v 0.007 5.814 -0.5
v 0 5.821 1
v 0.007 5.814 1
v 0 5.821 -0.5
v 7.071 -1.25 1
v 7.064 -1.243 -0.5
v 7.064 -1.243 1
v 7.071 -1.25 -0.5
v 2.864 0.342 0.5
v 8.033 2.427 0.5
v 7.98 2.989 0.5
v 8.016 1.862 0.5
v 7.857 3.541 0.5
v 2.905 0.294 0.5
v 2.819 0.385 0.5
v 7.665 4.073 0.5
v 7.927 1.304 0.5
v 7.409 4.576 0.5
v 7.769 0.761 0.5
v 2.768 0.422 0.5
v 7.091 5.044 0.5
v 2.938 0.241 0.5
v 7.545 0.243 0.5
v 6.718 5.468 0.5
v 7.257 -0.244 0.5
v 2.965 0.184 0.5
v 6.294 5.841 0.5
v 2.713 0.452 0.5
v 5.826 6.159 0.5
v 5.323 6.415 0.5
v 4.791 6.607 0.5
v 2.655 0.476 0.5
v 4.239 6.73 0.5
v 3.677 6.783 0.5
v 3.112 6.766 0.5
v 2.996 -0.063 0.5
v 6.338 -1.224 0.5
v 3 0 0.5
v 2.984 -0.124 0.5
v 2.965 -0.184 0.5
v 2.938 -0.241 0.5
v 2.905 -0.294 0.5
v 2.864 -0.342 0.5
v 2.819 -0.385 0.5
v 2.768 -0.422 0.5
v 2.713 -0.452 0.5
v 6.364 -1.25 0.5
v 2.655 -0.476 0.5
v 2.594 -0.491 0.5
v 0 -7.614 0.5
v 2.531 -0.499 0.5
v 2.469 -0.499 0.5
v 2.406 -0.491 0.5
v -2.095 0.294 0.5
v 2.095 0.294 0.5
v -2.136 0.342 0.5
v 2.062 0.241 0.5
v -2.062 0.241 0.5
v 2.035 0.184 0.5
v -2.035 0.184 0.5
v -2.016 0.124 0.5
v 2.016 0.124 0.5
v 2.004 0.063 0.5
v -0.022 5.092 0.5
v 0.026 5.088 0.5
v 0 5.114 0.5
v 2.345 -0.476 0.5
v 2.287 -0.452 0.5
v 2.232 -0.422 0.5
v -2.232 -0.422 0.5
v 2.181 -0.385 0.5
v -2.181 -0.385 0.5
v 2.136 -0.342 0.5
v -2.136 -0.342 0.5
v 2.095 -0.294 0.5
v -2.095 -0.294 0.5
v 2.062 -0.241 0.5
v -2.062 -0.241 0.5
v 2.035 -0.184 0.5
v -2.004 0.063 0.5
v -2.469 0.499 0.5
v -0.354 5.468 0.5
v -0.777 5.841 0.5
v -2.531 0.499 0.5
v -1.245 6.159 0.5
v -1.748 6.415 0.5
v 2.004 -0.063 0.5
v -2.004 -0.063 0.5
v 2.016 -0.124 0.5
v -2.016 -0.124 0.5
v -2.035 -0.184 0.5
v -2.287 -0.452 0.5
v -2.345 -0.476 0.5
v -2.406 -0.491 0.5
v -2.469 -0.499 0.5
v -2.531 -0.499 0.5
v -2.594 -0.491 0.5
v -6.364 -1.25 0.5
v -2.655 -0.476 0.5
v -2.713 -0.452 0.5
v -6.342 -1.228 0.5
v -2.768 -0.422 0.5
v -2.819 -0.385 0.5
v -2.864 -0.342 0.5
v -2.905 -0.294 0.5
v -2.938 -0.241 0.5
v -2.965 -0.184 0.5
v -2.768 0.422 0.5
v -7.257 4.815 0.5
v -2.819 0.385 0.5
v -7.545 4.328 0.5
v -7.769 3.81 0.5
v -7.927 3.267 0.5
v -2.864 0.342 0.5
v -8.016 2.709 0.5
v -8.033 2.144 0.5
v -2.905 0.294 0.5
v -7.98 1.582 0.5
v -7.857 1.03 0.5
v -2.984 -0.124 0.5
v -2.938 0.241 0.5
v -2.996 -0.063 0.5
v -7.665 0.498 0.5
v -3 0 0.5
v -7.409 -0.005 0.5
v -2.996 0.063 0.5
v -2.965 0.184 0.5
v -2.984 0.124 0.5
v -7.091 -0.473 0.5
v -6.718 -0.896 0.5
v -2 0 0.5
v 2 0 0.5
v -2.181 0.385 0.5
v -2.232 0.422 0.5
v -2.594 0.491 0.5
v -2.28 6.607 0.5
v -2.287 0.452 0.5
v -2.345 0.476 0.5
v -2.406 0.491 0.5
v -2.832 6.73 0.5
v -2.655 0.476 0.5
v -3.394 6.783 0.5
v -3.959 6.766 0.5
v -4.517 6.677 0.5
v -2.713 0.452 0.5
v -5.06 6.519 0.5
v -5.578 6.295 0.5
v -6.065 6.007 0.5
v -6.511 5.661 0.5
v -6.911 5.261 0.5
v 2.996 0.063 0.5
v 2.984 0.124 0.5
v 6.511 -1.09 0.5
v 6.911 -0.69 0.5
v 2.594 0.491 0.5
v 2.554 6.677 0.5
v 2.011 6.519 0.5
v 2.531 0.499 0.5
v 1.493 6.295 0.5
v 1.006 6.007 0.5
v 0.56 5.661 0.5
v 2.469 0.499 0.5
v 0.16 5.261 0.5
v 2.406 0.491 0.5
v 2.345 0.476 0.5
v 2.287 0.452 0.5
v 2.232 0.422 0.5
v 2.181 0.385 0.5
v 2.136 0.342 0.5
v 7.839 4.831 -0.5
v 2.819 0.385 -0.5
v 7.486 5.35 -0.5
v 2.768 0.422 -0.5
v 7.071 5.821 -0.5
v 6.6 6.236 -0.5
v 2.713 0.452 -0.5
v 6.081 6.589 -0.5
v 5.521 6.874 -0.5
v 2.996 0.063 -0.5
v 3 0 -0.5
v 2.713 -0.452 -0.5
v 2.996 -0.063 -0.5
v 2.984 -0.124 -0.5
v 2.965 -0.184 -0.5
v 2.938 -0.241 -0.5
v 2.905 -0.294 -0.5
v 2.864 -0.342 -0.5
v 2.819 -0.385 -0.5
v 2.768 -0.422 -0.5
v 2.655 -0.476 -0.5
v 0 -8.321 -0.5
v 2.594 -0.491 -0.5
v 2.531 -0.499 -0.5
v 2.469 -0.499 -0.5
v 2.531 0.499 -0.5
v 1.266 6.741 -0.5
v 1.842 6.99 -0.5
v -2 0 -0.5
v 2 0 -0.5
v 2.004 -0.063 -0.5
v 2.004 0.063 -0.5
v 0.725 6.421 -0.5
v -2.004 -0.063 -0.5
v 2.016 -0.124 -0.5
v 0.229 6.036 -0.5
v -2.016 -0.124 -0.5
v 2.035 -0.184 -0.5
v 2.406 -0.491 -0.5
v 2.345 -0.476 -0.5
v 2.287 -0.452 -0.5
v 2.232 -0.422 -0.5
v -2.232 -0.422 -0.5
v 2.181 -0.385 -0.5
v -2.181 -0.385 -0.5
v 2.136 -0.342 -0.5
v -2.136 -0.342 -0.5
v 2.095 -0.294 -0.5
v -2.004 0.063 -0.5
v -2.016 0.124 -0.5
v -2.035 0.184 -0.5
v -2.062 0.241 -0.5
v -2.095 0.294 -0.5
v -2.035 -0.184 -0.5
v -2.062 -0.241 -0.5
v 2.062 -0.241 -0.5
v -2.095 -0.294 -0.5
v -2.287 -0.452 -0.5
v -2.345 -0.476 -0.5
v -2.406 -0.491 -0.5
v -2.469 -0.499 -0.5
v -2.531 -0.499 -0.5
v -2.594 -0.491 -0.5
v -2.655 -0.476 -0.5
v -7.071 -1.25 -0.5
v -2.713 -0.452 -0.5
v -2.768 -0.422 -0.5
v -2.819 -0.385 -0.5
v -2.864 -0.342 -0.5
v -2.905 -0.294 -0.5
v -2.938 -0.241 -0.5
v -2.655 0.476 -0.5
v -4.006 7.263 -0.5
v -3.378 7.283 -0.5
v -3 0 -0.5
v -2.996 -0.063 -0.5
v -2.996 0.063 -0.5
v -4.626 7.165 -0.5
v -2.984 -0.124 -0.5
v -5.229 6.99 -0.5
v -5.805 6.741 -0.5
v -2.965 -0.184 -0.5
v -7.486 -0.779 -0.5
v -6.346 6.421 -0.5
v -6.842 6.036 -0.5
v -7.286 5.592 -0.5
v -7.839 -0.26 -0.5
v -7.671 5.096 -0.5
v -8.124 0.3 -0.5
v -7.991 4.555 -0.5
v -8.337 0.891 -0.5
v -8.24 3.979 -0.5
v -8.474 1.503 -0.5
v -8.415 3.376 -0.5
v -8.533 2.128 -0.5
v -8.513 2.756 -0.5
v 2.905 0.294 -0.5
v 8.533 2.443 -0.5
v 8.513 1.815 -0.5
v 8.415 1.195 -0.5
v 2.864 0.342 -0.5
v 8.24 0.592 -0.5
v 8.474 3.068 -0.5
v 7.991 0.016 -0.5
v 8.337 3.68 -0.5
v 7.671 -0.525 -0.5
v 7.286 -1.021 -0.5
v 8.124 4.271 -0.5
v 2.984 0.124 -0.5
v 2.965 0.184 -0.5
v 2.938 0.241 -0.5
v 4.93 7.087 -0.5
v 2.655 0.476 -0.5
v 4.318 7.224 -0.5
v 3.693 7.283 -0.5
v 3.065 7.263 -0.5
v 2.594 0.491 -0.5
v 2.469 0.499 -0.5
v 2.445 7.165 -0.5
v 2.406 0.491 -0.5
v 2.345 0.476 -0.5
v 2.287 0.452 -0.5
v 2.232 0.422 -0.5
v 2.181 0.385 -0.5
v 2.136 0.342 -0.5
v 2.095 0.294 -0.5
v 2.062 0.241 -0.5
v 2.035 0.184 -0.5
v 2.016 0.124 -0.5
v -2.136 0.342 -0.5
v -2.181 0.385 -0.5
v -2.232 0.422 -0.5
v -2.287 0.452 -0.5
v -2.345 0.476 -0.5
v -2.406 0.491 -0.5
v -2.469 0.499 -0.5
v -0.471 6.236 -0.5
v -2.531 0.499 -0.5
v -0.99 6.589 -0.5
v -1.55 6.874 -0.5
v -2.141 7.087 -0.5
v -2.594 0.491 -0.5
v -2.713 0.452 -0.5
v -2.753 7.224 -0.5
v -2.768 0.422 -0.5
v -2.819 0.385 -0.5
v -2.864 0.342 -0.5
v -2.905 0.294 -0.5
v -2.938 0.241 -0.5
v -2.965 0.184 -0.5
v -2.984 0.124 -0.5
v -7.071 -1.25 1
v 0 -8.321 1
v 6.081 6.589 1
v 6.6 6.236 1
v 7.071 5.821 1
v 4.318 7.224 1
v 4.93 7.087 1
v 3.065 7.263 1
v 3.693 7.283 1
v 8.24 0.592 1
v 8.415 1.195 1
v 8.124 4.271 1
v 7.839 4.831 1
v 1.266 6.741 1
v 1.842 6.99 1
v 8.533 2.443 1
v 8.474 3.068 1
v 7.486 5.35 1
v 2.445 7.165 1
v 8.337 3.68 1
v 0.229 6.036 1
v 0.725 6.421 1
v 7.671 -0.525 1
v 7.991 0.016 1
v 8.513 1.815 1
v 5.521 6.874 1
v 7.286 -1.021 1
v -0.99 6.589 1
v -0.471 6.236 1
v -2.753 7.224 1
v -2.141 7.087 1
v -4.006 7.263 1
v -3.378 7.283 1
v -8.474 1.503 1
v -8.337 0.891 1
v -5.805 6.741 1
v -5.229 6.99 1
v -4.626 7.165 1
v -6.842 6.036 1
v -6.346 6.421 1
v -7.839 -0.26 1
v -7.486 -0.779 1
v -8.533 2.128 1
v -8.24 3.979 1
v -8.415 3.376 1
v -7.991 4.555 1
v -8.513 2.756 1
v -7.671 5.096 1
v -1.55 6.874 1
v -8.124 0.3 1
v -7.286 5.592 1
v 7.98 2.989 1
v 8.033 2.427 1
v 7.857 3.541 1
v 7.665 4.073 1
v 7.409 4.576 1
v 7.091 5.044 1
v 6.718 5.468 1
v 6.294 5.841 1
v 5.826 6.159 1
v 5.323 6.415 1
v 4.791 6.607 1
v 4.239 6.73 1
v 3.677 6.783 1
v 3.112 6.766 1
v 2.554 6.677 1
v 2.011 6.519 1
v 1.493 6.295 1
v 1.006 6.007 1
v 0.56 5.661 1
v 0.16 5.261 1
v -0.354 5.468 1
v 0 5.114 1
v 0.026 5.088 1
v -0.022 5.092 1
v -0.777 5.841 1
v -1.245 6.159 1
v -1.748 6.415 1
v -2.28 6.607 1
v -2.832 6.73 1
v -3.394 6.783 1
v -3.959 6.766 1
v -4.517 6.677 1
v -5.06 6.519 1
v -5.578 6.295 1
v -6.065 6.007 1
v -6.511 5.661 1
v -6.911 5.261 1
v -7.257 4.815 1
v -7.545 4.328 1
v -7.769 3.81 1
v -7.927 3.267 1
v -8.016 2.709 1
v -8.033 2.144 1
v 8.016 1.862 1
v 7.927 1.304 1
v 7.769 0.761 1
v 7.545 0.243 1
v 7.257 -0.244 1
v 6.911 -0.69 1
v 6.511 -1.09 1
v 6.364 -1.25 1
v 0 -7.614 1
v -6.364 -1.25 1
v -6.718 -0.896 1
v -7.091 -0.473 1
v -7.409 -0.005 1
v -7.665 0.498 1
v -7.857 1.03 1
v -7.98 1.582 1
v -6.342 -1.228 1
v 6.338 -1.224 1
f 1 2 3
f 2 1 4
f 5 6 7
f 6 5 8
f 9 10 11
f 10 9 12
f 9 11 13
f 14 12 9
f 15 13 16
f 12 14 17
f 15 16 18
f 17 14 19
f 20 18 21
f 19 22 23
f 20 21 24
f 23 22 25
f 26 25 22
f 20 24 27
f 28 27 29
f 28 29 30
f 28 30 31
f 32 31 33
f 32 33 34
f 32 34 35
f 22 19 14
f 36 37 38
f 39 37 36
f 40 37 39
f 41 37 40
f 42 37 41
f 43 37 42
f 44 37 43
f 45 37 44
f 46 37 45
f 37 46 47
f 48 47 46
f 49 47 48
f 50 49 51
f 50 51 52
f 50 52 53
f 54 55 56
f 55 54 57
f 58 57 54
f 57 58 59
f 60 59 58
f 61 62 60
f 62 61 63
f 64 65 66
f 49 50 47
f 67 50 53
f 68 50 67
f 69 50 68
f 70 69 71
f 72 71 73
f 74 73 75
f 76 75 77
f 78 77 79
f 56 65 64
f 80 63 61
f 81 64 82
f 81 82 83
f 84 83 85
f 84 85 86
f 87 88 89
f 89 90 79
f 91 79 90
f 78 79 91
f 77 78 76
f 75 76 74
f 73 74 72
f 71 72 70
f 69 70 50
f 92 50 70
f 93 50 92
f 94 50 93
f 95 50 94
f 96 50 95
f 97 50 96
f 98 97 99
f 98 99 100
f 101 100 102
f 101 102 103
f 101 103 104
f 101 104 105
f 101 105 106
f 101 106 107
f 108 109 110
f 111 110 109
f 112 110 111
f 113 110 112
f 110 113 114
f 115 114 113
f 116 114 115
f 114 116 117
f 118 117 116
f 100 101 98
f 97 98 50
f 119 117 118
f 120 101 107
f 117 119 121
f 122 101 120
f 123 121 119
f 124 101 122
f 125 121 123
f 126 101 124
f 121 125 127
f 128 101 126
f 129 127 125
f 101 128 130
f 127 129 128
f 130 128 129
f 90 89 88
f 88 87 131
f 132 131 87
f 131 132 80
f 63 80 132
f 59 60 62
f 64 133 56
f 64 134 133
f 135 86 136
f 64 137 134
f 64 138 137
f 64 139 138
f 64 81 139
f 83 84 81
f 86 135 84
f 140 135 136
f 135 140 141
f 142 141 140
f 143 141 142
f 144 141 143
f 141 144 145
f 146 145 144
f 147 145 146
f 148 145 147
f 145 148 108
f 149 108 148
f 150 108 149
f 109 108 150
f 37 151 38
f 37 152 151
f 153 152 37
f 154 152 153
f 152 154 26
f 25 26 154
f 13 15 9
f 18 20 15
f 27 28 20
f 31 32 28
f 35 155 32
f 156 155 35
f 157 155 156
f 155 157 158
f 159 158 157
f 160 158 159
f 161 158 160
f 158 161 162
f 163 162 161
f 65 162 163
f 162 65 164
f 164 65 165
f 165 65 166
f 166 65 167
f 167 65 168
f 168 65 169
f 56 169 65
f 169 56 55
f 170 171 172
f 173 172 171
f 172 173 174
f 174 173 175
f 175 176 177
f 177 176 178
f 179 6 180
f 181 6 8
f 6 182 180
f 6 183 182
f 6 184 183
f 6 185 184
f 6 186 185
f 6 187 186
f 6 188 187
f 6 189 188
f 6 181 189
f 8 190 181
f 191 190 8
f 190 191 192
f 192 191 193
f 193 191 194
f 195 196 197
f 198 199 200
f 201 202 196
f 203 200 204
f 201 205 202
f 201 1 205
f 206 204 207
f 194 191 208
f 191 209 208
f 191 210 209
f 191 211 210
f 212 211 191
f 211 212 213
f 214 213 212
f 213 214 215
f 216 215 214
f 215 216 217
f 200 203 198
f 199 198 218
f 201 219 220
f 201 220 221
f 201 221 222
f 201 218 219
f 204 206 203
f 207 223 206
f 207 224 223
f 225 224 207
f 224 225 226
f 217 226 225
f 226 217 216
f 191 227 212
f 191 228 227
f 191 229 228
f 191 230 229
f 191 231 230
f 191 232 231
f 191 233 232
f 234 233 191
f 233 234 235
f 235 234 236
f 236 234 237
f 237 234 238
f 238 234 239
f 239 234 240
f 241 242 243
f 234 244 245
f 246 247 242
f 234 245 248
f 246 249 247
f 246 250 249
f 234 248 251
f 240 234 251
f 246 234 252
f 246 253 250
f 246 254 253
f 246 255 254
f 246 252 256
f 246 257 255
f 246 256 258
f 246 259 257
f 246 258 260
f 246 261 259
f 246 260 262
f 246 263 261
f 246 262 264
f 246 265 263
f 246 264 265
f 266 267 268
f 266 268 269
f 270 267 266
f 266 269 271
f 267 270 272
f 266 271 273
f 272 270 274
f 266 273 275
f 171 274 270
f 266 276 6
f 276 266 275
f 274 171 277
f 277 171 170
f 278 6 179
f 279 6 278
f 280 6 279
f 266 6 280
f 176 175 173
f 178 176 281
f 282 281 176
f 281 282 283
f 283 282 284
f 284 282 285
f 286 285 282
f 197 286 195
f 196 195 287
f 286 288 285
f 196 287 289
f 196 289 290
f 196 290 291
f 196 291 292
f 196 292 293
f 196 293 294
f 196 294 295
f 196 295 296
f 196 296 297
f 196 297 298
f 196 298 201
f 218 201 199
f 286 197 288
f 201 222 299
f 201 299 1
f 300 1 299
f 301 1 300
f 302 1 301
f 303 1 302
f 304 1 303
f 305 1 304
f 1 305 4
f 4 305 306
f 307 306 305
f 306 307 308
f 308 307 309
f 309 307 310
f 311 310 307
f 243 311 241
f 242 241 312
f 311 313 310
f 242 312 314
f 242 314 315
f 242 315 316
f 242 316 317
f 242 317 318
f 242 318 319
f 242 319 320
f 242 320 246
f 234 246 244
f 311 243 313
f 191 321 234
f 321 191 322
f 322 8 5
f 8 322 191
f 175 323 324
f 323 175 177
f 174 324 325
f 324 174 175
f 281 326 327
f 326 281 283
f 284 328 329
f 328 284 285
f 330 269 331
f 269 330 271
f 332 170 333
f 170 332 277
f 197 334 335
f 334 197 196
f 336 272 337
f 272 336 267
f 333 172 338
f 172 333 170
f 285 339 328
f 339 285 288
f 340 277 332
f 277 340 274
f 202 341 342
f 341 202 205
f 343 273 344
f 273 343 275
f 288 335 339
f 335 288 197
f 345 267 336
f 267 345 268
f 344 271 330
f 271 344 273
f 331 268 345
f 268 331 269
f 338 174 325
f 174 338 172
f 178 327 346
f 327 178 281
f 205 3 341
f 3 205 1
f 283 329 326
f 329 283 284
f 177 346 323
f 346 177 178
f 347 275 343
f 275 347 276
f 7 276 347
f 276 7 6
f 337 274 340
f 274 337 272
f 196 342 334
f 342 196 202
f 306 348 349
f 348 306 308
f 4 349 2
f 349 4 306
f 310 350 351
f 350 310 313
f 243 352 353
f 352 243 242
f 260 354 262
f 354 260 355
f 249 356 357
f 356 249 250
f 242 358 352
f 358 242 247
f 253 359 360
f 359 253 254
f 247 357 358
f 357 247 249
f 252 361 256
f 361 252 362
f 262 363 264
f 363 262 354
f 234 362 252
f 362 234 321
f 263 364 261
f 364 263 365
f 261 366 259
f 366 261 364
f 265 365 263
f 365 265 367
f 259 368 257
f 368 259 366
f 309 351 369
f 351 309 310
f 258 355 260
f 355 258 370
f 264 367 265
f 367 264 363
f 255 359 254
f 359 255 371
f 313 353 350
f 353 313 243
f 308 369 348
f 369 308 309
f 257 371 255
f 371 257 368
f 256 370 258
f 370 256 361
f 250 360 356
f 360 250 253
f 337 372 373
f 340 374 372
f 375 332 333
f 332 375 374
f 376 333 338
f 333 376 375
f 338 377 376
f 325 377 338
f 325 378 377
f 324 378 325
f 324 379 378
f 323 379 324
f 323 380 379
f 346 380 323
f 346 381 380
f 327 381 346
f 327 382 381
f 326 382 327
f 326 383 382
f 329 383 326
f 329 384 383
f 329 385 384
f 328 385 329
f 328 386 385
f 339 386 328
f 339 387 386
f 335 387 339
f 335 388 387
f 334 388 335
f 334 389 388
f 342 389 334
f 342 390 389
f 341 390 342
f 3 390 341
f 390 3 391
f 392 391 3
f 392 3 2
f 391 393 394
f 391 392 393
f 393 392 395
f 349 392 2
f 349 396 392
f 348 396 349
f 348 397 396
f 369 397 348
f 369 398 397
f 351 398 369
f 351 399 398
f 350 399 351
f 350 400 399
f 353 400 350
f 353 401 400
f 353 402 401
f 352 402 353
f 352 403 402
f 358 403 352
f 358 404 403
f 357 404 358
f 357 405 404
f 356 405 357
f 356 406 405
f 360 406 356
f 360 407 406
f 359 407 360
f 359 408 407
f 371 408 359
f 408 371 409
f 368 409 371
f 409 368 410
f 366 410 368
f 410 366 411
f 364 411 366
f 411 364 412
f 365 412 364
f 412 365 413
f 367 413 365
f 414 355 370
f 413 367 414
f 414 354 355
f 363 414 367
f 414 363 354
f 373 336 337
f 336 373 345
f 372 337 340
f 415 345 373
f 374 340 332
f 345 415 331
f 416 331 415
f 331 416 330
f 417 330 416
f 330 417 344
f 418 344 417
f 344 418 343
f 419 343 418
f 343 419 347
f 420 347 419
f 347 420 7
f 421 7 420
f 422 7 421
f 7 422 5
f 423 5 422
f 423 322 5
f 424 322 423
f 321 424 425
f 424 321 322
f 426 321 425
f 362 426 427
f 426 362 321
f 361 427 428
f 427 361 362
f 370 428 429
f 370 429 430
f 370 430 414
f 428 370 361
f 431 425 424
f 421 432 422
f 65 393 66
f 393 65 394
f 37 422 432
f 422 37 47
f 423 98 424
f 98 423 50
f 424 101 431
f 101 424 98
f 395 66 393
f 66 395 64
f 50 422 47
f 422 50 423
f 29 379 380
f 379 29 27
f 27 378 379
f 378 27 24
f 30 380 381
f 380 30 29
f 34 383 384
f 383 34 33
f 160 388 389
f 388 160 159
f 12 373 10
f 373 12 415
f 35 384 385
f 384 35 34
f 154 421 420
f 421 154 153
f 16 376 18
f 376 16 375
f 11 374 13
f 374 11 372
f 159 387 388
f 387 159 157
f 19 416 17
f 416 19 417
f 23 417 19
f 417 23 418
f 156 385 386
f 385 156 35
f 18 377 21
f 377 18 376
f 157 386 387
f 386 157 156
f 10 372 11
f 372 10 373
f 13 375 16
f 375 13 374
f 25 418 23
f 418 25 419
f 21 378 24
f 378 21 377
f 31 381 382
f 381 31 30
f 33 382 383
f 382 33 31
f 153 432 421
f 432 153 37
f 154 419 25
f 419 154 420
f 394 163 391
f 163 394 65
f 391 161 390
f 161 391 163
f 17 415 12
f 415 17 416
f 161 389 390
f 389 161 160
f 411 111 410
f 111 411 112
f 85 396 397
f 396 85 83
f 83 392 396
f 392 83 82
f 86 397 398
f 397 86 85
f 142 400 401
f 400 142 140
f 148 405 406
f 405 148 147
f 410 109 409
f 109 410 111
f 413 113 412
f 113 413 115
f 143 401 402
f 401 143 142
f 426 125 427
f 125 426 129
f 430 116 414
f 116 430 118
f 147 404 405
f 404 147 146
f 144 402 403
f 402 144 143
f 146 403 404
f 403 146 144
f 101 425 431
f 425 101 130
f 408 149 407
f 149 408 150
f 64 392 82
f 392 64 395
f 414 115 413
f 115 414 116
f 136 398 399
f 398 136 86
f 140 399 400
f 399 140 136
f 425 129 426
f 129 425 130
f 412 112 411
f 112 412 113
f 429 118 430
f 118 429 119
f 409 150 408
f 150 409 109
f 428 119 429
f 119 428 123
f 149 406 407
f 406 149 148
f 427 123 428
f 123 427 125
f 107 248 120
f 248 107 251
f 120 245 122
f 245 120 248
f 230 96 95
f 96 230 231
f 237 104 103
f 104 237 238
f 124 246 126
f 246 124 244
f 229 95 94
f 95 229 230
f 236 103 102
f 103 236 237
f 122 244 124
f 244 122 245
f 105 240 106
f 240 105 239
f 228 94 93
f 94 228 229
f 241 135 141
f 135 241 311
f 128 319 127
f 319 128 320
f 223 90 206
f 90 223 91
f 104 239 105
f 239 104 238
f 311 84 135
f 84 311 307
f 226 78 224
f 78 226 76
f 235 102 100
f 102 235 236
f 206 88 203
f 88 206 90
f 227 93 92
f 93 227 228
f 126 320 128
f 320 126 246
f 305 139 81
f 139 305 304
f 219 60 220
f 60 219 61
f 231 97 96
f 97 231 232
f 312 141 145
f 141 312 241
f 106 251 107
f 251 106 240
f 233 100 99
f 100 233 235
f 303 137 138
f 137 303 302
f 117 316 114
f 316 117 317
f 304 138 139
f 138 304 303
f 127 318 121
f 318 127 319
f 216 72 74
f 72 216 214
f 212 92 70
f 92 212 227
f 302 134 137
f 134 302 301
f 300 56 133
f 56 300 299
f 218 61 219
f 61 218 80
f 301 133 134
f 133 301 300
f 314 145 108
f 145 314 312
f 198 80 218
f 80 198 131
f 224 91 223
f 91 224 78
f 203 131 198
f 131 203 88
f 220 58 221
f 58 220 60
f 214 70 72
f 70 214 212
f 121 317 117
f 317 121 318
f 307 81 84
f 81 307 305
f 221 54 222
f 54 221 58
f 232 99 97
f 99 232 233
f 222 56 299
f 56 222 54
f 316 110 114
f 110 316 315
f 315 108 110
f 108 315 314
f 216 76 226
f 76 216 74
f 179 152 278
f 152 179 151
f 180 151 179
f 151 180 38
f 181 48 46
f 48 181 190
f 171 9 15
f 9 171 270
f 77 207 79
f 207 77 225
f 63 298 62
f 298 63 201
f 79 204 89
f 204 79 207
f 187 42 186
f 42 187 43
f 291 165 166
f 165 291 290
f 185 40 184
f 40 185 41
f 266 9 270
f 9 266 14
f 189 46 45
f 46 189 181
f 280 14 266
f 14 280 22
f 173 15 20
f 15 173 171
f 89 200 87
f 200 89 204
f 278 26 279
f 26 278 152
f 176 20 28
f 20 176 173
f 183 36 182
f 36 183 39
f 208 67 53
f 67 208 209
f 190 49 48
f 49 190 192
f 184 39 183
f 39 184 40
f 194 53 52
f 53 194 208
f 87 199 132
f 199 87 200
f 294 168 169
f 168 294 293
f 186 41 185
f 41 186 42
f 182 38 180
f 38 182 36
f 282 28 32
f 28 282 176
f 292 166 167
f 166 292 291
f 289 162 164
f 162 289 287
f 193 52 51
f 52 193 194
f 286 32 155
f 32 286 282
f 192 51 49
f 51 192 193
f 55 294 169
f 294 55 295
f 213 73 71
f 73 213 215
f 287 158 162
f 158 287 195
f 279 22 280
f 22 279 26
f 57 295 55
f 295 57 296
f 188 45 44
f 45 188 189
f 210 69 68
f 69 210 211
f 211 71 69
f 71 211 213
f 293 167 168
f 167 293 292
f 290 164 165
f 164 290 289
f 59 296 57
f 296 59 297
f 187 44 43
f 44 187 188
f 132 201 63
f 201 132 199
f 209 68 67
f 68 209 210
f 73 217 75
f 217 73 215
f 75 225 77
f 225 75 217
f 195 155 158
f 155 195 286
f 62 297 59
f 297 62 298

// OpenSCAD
//+-------------------------------------------------+
//|OPENSCAD Bouton de mercercie - haberdasher Button|
//|        2015 gaziel@gmail.com                    |
//+- -----------------------------------------------+   

//your choice...   
type="love";//[round,square,flower,cat,bunny,MMice,love]

//external diameter or length of the button
bd=10;

//thinkness
bep=1;

//border ? Yes of course!
border="yes";//[yes,no]

//allowance
borderep=1;

//size  for the border 
borderd=1;

//number of holes
hn=2;//[2,4,6]

//hole diameter
hd=1;

//holes repartition diameter
hr=4;

$fn=100/2;

bouton();

module bouton(){
    difference(){
        corps();
        for (i=[1:hn]){
            rotate([0,0,(i*360)/hn])translate([(hr+hd)/2,0,0]) cylinder(d=hd,h=bep+1,center=true);
        }
    } 
}
module corps(){
   if (type=="round"){
       cylinder(d=bd,h=bep,center=true);
       if (border=="yes"){
           difference(){
               translate([0,0,bep/2])cylinder(d=bd,h=borderep,center=true);
               translate([0,0,bep/2])cylinder(d=bd-borderd,h=borderep+1,center=true);
           }
        }          
   }
  if (type=="square"){
   cube([bd,bd,bep],center=true);
   if (border=="yes"){
       difference(){
           translate([0,0,bep/2]) cube([bd,bd,borderep],center=true);
           translate([0,0,bep/2])cube([bd-borderd,bd-borderd,borderep+1],center=true);
       }
    }          
}
  if (type=="flower"){
   for (i=[1:6]){
    rotate([0,0,(i*360)/6])translate([bd/3,0,0]) cylinder(d=bd/3,h=bep,center=true);
   }
   cylinder(d=bd/1.6,h=bep,center=true);
   if (border=="yes"){
       difference(){
           union(){
                  for (i=[1:6]){
translate([0,0,bep/2])    rotate([0,0,(i*360)/6])translate([bd/3,0,0]) cylinder(d=bd/3,h=borderep,center=true);
   }
  translate([0,0,bep/2]) cylinder(d=bd/1.6,h=borderep,center=true);
           }
                      union(){
                  for (i=[1:6]){
translate([0,0,bep/2])    rotate([0,0,(i*360)/6])translate([bd/3,0,0]) cylinder(d=(bd/3)-borderd,h=borderep+1,center=true);
   }
  translate([0,0,bep/2]) cylinder(d=(bd/1.6)-borderd/2,h=borderep+1,center=true);
           }

       }
    }          
}
    if (type=="cat"){
        cylinder(d=bd,h=bep,center=true);
        difference(){
            union(){
                rotate([0,0,33])scale([0.5,1.5,1])cylinder(d=bd,h=bep,center=true);
                rotate([0,0,-33])scale([0.5,1.5,1])cylinder(d=bd,h=bep,center=true);
            }    
            translate([-bd/2,0,-bd/2])cube(bd);
            
        }
       if (border=="yes"){
           difference(){
               translate([0,0,bep/2])cylinder(d=bd,h=borderep,center=true);
               translate([0,0,bep/2])cylinder(d=bd-borderd,h=borderep+1,center=true);
           }
        }          
   }
   
       if (type=="bunny"){//bof
        cylinder(d=bd,h=bep,center=true);
        difference(){
            union(){
                translate([bd/2,-bd/2,0])rotate([0,0,33])scale([0.5,1.2,1])cylinder(d=bd,h=bep,center=true);
                translate([-bd/2,-bd/2,0])rotate([0,0,-33])scale([0.5,1.2,1])cylinder(d=bd,h=bep,center=true);
            }    
           
            
        }
       if (border=="yes"){
           difference(){
               translate([0,0,bep/2])cylinder(d=bd,h=borderep,center=true);
               translate([0,0,bep/2])cylinder(d=bd-borderd,h=borderep+1,center=true);
           }
        }          
   }
   
      if (type=="MMice"){
        cylinder(d=bd,h=bep,center=true);
        difference(){
            union(){
                translate([bd/2,-bd/2,0])rotate([0,0,33])cylinder(d=bd/1.618,h=bep,center=true);
                translate([-bd/2,-bd/2,0])rotate([0,0,-33])cylinder(d=bd/1.618,h=bep,center=true);
            }       
         }
       if (border=="yes"){
           difference(){
               translate([0,0,bep/2])cylinder(d=bd,h=borderep,center=true);
               translate([0,0,bep/2])cylinder(d=bd-borderd,h=borderep+1,center=true);
           }
        }          
   }
     if (type=="love"){
       translate([0,-bd/8,0])rotate([0,0,45]){
         cube([bd,bd,bep],center=true);
         translate([bd/2,0,0])cylinder(d=bd,h=bep,center=true);
         translate([0,bd/2,0])cylinder(d=bd,h=bep,center=true);
       }      
       if (border=="yes"){
           difference(){
               translate([0,0,bep/2]) union(){ 
                 translate([0,-bd/8,0])rotate([0,0,45]){
                 cube([bd,bd,bep],center=true);
                 translate([bd/2,0,0])cylinder(d=bd,h=bep,center=true);
                 translate([0,bd/2,0])cylinder(d=bd,h=bep,center=true);
                 }
               }
               translate([0,0,bep/2]) union(){ 
                 translate([0,-bd/8,0])rotate([0,0,45]){
                 cube([bd-borderd,bd-borderd,bep+1],center=true);
                 translate([bd/2,0,0])cylinder(d=bd-borderd,h=bep+1,center=true);
                 translate([0,bd/2,0])cylinder(d=bd-borderd,h=bep+1,center=true);
                 }
               }  
            }
       }
     }
 }
